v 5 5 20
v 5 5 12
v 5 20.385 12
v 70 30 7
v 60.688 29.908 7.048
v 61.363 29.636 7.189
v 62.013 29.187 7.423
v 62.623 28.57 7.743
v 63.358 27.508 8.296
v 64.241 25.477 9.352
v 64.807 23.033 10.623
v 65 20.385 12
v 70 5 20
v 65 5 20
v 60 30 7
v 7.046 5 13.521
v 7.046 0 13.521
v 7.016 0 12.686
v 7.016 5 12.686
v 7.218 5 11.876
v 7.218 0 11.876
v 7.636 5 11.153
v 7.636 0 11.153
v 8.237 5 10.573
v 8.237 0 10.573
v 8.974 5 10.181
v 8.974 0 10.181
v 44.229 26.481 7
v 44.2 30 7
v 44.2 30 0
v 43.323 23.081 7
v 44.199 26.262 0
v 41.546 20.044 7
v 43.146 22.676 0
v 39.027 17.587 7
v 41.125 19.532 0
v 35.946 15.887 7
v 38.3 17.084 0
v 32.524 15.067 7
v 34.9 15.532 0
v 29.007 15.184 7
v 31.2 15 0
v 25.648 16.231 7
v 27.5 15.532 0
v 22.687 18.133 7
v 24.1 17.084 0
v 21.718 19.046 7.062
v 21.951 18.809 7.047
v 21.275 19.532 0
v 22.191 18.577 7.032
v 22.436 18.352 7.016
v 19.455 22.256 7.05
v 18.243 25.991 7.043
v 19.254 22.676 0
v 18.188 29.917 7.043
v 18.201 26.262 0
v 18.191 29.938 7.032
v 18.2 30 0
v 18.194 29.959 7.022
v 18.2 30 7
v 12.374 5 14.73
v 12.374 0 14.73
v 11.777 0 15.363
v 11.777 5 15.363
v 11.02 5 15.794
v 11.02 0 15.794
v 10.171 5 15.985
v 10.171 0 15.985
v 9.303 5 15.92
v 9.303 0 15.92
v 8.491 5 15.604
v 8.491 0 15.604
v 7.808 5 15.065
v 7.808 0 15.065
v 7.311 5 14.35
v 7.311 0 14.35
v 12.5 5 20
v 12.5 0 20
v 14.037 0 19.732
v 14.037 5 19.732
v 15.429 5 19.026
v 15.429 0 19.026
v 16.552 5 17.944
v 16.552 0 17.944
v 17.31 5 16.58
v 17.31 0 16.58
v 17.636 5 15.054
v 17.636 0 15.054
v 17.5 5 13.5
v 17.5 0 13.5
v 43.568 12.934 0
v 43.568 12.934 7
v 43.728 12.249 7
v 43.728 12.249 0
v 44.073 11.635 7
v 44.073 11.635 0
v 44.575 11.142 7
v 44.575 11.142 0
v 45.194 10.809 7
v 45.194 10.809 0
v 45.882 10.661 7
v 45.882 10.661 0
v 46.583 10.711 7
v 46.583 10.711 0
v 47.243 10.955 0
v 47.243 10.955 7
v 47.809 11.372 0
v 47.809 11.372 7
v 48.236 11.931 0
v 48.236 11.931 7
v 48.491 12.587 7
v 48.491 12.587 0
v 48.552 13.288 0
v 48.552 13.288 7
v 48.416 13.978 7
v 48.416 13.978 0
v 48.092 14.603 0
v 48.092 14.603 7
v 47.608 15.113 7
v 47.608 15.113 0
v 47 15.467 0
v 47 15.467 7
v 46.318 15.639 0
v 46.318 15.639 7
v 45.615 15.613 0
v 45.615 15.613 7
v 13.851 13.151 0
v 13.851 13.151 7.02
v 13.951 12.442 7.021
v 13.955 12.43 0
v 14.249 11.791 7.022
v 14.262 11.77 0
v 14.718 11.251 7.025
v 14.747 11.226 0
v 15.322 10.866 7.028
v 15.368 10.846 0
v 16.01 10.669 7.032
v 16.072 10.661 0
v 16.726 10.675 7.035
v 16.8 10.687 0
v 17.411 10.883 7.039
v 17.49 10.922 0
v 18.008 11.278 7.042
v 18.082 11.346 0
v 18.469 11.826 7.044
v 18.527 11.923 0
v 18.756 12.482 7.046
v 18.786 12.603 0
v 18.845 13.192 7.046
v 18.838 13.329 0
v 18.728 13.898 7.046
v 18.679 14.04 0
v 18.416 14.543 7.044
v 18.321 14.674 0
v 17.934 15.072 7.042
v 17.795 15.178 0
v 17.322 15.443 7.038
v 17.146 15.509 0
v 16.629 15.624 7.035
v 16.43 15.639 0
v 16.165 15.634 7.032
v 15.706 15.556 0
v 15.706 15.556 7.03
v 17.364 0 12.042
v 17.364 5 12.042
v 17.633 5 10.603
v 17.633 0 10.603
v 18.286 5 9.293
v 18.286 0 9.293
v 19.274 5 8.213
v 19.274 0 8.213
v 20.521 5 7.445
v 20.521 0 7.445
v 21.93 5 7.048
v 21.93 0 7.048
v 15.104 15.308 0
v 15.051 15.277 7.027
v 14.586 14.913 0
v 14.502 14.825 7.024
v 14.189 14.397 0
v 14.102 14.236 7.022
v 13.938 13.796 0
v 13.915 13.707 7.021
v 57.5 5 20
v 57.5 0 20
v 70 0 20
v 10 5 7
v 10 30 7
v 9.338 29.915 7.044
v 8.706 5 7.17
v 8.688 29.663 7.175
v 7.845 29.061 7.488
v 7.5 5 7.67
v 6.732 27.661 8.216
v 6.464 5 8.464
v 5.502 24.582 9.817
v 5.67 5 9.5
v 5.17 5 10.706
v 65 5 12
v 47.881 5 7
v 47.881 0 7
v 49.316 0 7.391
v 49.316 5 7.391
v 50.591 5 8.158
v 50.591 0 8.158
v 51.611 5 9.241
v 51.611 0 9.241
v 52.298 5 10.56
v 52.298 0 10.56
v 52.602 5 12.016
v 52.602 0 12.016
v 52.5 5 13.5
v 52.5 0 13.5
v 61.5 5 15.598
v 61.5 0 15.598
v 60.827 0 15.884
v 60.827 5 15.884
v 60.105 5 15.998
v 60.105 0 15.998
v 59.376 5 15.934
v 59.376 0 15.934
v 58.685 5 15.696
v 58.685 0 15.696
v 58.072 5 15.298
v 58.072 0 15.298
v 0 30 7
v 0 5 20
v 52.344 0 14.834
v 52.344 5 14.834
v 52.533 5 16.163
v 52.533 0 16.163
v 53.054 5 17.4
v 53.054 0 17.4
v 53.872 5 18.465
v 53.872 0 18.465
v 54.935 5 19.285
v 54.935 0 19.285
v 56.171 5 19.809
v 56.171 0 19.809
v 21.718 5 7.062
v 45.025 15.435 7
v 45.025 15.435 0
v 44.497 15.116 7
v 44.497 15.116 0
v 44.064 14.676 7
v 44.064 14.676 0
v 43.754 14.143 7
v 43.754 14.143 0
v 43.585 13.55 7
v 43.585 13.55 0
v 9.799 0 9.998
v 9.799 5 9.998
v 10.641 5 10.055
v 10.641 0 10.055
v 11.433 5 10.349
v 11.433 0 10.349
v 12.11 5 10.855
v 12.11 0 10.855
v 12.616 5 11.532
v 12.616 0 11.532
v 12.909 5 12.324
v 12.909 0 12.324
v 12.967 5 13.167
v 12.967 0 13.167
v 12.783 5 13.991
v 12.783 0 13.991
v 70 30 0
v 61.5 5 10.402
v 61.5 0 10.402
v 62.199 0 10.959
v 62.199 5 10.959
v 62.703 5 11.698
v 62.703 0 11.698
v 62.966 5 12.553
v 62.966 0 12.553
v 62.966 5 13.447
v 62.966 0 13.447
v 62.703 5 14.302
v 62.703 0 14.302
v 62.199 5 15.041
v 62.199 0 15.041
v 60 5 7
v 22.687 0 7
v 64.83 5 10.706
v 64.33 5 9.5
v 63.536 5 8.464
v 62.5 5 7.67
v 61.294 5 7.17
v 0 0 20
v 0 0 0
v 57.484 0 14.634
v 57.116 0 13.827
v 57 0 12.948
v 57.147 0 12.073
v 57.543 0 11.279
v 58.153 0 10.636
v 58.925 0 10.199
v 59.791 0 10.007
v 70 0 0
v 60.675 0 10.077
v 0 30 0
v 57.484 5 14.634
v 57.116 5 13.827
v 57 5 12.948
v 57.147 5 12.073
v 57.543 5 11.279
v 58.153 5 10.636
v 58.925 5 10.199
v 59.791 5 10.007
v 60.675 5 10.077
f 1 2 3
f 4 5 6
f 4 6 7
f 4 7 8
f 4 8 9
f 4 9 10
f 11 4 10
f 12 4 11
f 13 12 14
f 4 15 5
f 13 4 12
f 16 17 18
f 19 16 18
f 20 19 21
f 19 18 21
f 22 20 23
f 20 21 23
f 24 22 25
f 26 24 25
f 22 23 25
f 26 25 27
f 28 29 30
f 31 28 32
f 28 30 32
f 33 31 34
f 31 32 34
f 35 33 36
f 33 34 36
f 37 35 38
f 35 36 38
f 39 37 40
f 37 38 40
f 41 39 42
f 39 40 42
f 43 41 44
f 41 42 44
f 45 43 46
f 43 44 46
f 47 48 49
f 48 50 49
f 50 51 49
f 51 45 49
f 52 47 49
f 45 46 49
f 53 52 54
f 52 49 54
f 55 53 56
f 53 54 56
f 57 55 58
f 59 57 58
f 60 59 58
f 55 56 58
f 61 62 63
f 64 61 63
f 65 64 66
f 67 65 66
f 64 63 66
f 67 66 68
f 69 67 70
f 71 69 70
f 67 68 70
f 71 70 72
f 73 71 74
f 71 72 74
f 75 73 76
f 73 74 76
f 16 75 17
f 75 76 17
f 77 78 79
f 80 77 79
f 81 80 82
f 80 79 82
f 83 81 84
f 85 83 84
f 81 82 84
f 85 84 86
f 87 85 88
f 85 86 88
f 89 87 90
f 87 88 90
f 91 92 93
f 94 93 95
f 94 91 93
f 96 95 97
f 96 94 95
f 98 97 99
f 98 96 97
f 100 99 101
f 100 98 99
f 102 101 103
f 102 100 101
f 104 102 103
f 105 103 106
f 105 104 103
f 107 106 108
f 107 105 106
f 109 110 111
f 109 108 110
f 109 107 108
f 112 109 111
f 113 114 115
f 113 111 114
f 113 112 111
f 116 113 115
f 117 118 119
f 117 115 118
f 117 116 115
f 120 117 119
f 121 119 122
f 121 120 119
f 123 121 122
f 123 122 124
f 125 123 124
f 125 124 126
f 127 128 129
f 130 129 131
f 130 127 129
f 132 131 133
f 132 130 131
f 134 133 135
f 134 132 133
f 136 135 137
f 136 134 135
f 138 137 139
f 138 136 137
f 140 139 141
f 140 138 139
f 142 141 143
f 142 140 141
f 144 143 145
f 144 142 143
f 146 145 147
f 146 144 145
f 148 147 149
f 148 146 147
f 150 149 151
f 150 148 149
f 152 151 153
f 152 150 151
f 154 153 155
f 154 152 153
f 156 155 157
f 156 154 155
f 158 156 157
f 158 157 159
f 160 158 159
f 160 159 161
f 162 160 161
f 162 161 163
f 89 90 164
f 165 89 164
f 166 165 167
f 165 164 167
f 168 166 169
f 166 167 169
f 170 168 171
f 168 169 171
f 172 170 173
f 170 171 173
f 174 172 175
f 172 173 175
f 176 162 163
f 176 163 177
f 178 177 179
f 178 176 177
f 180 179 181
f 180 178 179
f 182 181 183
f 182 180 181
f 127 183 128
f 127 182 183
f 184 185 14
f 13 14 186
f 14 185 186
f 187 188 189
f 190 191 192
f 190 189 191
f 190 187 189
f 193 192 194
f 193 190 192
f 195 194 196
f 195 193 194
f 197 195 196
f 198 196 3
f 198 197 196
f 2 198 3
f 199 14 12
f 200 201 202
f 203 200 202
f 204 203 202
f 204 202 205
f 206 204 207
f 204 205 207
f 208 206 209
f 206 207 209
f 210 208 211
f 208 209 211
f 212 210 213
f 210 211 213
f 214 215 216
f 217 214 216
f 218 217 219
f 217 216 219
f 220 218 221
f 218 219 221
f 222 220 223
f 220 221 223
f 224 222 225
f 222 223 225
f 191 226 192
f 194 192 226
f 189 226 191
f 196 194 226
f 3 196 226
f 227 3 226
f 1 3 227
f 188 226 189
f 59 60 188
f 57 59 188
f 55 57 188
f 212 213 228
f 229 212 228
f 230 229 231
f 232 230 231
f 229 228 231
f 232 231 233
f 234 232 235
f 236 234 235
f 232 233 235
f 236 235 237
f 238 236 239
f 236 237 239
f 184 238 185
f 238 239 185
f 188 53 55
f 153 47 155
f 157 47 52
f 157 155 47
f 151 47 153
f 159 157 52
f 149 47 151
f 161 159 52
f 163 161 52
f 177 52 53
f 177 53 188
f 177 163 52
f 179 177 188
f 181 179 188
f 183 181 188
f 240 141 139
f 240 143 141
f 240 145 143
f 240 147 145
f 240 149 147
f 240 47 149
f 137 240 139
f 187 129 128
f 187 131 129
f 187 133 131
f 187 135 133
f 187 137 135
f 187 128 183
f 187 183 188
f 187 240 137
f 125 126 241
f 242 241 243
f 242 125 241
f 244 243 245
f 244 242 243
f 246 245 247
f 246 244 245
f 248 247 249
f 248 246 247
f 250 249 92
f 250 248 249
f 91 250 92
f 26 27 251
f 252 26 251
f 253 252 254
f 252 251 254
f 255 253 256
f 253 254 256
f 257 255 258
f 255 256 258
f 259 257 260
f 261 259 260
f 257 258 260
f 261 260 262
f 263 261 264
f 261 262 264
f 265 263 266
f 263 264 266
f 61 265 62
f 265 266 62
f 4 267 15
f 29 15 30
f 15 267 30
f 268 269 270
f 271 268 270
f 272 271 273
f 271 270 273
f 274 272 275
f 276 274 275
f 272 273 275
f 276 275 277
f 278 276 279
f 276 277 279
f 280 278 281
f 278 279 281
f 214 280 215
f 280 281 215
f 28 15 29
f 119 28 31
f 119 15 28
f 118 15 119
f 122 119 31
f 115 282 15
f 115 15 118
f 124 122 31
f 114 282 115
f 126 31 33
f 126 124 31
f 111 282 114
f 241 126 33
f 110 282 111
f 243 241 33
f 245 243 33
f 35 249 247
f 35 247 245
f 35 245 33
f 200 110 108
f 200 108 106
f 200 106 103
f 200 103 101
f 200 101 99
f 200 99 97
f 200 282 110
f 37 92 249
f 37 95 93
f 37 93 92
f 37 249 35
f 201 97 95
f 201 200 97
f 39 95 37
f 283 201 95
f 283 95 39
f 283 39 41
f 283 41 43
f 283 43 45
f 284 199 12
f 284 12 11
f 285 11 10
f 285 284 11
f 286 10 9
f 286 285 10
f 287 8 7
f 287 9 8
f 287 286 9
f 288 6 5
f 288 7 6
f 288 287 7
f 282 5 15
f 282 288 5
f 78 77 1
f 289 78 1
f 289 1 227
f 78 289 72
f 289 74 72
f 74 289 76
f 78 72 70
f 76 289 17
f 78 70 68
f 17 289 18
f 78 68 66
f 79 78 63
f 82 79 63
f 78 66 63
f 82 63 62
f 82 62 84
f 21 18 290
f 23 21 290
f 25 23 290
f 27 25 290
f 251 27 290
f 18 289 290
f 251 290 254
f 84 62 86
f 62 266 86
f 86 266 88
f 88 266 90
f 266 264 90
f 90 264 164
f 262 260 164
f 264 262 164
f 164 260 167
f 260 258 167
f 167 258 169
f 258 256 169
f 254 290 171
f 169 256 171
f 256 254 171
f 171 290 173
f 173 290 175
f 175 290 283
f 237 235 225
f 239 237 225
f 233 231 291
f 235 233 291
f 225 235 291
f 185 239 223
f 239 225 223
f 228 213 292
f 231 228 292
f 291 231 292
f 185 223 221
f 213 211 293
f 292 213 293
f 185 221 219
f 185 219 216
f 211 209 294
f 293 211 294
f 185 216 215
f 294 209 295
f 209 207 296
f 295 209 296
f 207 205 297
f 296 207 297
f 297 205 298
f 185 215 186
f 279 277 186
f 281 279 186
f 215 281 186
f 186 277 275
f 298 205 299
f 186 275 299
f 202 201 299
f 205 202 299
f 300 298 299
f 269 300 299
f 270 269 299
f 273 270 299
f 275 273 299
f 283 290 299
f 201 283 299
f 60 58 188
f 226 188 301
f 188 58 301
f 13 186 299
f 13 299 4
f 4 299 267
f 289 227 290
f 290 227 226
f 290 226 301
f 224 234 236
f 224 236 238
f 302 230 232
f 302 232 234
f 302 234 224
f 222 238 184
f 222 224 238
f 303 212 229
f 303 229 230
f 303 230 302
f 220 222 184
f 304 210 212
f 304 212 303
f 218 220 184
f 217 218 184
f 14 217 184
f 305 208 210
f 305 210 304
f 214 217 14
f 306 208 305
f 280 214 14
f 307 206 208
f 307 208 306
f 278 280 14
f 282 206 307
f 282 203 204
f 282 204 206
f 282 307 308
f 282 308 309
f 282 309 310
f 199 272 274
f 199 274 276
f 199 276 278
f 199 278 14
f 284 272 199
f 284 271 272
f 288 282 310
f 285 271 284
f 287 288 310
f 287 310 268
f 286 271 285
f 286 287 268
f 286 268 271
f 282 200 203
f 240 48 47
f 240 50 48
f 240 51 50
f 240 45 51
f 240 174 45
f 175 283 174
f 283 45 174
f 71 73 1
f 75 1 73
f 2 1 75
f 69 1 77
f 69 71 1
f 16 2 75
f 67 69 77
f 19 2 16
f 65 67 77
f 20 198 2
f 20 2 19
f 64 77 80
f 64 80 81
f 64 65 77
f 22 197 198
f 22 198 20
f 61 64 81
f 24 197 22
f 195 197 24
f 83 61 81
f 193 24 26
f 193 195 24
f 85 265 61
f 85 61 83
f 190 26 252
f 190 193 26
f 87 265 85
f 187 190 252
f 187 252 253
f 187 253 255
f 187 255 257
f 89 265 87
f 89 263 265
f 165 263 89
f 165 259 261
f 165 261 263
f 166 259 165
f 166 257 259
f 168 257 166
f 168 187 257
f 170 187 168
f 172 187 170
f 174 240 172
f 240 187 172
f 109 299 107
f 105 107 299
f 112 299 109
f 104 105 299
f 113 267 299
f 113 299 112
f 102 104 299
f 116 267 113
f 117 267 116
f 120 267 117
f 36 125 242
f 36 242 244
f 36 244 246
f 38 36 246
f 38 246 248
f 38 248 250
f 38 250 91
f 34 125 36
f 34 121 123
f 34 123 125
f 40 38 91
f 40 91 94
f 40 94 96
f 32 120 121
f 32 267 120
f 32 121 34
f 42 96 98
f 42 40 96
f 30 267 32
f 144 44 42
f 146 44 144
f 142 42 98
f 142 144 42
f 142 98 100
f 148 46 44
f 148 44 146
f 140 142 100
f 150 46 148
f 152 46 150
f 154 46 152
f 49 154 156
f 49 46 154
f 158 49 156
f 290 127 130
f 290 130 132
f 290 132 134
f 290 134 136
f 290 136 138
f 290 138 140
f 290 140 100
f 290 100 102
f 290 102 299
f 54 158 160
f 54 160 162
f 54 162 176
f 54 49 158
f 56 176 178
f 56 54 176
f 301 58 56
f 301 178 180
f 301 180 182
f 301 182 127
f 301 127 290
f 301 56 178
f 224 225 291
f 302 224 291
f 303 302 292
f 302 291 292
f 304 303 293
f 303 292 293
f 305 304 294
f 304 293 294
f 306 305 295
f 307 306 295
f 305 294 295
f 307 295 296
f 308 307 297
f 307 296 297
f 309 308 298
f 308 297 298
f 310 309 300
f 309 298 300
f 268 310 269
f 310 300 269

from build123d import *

# Parameters (mm, degrees)
SKETCH1_W           = 70
SKETCH1_H           = 30
BOSS_EXTRUDE1_DEPTH = 20
CUT_EXTRUDE2_DEPTH  = 21
CUT_EXTRUDE3_DEPTH  = 71
CUT_EXTRUDE7_DEPTH  = 31
BOSS_EXTRUDE3_DEPTH = 5
CUT_EXTRUDE8_DEPTH  = 71


with BuildPart() as part:
    # Sketch1 → Boss-Extrude1 (new body)
    with BuildSketch(Plane.XY):
        with Locations((-35, 15)):
            Rectangle(SKETCH1_W, SKETCH1_H)
    boss_extrude1 = extrude(amount=BOSS_EXTRUDE1_DEPTH)

    # Sketch1_3 → Cut-Extrude2 (cut, through all)
    with BuildSketch(Plane.XY):
        with BuildLine():
            Line((-18.200000763, 30), (-44.200000763, 30))
            ThreePointArc((-44.200000763, 30), (-31.200000763, 15), (-18.200000763, 30))
        make_face()
        with BuildLine():
            ThreePointArc((-15.706172943, 15.55638361), (-14.370568008, 14.668173822), (-13.850757599, 13.150756836))
            ThreePointArc((-13.850757599, 13.150756836), (-18.325338895, 11.617932335), (-15.706172943, 15.55638361))
        make_face()
        with BuildLine():
            ThreePointArc((-45.615119934, 15.61277771), (-44.064114621, 14.676308172), (-43.56823349, 12.933696747))
            ThreePointArc((-43.56823349, 12.933696747), (-48.042503261, 11.636717399), (-45.615119934, 15.61277771))
        make_face()
    cut_extrude2 = extrude(amount=CUT_EXTRUDE2_DEPTH, mode=Mode.SUBTRACT)

    # Sketch2 → Cut-Extrude3 (cut, through all)
    with BuildSketch(Plane.ZY.offset(70)):
        Polygon((20, 30), (7, 30), (20, 5), align=None)
    cut_extrude3 = extrude(amount=-CUT_EXTRUDE3_DEPTH, mode=Mode.SUBTRACT)

    # Mirror1: Boss-Extrude1, Cut-Extrude2, Cut-Extrude3 across plane
    add(boss_extrude1.mirror(Plane(origin=(0, 30, 20), x_dir=(0, 0, 1), z_dir=(1, 0, 0))))
    add(cut_extrude2.mirror(Plane(origin=(0, 30, 20), x_dir=(0, 0, 1), z_dir=(1, 0, 0))), mode=Mode.SUBTRACT)
    add(cut_extrude3.mirror(Plane(origin=(0, 30, 20), x_dir=(0, 0, 1), z_dir=(1, 0, 0))), mode=Mode.SUBTRACT)

    # Sketch4 → Cut-Extrude7 (cut, through all)
    with BuildSketch(Plane(origin=(0, 0, 0), x_dir=(1, 0, 0), z_dir=(0, 1, 0))):
        with BuildLine():
            Line((5, -11.999999865), (5, -20))
            Line((5, -20), (65, -20))
            Line((65, -20), (65, -12))
            ThreePointArc((65, -12), (63.535533906, -8.464466094), (60, -7))
            Line((60, -7), (22.686811447, -7))
            Line((22.686811447, -7), (21.717826843, -7.061558247))
            Line((21.717826843, -7.061558247), (10, -7))
            ThreePointArc((10, -7), (6.464466102, -8.464466007), (5, -11.999999865))
        make_face()
    extrude(amount=CUT_EXTRUDE7_DEPTH, mode=Mode.SUBTRACT)

    # Sketch4_6 → Boss-Extrude3 (add)
    with BuildSketch(Plane(origin=(0, 0, 0), x_dir=(1, 0, 0), z_dir=(0, 1, 0))):
        with BuildLine():
            Line((57.5, -20), (65, -20))
            Line((65, -20), (65, -12))
            ThreePointArc((65, -12), (63.535533906, -8.464466094), (60, -7))
            Line((60, -7), (47.881000272, -7))
            ThreePointArc((47.881000272, -7), (51.610779808, -9.240727474), (52.5, -13.5))
            ThreePointArc((52.5, -13.5), (53.428531793, -17.958821698), (57.5, -20))
        make_face()
        with BuildLine():
            ThreePointArc((58.071636237, -15.298134071), (57.54254335, -11.279271131), (61.499999792, -10.401924497))
            ThreePointArc((61.499999792, -10.401924497), (62.999999734, -13.000000826), (61.499999759, -15.598077136))
            ThreePointArc((61.499999759, -15.598077136), (59.738532149, -15.988585106), (58.071636237, -15.298134071))
        make_face(mode=Mode.SUBTRACT)
        with BuildLine():
            Line((5, -11.999999865), (5, -20))
            Line((5, -20), (12.5, -20))
            ThreePointArc((12.5, -20), (16.552378538, -17.944137337), (17.5, -13.5))
            ThreePointArc((17.5, -13.5), (18.286173232, -9.293081984), (21.929830501, -7.048089949))
            Line((21.929830501, -7.048089949), (21.717826843, -7.061558247))
            Line((21.717826843, -7.061558247), (10, -7))
            ThreePointArc((10, -7), (6.464466102, -8.464466007), (5, -11.999999865))
        make_face()
        with BuildLine():
            ThreePointArc((7.045577049, -13.520944595), (7.401923496, -11.500000278), (8.973938942, -10.180922508))
            ThreePointArc((8.973938942, -10.180922508), (12.387007699, -11.175196953), (12.37415177, -14.730116746))
            ThreePointArc((12.37415177, -14.730116746), (9.302656578, -15.920012423), (7.045577049, -13.520944595))
        make_face(mode=Mode.SUBTRACT)
    extrude(amount=BOSS_EXTRUDE3_DEPTH)

    # Sketch11 → Cut-Extrude8 (cut, through all)
    with BuildSketch(Plane(origin=(0, 0, 0), x_dir=(0, 0, -1), z_dir=(1, 0, 0))):
        Polygon((-20, 0), (0, 0), (0, 30), (-7, 30), (-20, 5), align=None)
    extrude(amount=-CUT_EXTRUDE8_DEPTH, mode=Mode.SUBTRACT)


solid = part.part
